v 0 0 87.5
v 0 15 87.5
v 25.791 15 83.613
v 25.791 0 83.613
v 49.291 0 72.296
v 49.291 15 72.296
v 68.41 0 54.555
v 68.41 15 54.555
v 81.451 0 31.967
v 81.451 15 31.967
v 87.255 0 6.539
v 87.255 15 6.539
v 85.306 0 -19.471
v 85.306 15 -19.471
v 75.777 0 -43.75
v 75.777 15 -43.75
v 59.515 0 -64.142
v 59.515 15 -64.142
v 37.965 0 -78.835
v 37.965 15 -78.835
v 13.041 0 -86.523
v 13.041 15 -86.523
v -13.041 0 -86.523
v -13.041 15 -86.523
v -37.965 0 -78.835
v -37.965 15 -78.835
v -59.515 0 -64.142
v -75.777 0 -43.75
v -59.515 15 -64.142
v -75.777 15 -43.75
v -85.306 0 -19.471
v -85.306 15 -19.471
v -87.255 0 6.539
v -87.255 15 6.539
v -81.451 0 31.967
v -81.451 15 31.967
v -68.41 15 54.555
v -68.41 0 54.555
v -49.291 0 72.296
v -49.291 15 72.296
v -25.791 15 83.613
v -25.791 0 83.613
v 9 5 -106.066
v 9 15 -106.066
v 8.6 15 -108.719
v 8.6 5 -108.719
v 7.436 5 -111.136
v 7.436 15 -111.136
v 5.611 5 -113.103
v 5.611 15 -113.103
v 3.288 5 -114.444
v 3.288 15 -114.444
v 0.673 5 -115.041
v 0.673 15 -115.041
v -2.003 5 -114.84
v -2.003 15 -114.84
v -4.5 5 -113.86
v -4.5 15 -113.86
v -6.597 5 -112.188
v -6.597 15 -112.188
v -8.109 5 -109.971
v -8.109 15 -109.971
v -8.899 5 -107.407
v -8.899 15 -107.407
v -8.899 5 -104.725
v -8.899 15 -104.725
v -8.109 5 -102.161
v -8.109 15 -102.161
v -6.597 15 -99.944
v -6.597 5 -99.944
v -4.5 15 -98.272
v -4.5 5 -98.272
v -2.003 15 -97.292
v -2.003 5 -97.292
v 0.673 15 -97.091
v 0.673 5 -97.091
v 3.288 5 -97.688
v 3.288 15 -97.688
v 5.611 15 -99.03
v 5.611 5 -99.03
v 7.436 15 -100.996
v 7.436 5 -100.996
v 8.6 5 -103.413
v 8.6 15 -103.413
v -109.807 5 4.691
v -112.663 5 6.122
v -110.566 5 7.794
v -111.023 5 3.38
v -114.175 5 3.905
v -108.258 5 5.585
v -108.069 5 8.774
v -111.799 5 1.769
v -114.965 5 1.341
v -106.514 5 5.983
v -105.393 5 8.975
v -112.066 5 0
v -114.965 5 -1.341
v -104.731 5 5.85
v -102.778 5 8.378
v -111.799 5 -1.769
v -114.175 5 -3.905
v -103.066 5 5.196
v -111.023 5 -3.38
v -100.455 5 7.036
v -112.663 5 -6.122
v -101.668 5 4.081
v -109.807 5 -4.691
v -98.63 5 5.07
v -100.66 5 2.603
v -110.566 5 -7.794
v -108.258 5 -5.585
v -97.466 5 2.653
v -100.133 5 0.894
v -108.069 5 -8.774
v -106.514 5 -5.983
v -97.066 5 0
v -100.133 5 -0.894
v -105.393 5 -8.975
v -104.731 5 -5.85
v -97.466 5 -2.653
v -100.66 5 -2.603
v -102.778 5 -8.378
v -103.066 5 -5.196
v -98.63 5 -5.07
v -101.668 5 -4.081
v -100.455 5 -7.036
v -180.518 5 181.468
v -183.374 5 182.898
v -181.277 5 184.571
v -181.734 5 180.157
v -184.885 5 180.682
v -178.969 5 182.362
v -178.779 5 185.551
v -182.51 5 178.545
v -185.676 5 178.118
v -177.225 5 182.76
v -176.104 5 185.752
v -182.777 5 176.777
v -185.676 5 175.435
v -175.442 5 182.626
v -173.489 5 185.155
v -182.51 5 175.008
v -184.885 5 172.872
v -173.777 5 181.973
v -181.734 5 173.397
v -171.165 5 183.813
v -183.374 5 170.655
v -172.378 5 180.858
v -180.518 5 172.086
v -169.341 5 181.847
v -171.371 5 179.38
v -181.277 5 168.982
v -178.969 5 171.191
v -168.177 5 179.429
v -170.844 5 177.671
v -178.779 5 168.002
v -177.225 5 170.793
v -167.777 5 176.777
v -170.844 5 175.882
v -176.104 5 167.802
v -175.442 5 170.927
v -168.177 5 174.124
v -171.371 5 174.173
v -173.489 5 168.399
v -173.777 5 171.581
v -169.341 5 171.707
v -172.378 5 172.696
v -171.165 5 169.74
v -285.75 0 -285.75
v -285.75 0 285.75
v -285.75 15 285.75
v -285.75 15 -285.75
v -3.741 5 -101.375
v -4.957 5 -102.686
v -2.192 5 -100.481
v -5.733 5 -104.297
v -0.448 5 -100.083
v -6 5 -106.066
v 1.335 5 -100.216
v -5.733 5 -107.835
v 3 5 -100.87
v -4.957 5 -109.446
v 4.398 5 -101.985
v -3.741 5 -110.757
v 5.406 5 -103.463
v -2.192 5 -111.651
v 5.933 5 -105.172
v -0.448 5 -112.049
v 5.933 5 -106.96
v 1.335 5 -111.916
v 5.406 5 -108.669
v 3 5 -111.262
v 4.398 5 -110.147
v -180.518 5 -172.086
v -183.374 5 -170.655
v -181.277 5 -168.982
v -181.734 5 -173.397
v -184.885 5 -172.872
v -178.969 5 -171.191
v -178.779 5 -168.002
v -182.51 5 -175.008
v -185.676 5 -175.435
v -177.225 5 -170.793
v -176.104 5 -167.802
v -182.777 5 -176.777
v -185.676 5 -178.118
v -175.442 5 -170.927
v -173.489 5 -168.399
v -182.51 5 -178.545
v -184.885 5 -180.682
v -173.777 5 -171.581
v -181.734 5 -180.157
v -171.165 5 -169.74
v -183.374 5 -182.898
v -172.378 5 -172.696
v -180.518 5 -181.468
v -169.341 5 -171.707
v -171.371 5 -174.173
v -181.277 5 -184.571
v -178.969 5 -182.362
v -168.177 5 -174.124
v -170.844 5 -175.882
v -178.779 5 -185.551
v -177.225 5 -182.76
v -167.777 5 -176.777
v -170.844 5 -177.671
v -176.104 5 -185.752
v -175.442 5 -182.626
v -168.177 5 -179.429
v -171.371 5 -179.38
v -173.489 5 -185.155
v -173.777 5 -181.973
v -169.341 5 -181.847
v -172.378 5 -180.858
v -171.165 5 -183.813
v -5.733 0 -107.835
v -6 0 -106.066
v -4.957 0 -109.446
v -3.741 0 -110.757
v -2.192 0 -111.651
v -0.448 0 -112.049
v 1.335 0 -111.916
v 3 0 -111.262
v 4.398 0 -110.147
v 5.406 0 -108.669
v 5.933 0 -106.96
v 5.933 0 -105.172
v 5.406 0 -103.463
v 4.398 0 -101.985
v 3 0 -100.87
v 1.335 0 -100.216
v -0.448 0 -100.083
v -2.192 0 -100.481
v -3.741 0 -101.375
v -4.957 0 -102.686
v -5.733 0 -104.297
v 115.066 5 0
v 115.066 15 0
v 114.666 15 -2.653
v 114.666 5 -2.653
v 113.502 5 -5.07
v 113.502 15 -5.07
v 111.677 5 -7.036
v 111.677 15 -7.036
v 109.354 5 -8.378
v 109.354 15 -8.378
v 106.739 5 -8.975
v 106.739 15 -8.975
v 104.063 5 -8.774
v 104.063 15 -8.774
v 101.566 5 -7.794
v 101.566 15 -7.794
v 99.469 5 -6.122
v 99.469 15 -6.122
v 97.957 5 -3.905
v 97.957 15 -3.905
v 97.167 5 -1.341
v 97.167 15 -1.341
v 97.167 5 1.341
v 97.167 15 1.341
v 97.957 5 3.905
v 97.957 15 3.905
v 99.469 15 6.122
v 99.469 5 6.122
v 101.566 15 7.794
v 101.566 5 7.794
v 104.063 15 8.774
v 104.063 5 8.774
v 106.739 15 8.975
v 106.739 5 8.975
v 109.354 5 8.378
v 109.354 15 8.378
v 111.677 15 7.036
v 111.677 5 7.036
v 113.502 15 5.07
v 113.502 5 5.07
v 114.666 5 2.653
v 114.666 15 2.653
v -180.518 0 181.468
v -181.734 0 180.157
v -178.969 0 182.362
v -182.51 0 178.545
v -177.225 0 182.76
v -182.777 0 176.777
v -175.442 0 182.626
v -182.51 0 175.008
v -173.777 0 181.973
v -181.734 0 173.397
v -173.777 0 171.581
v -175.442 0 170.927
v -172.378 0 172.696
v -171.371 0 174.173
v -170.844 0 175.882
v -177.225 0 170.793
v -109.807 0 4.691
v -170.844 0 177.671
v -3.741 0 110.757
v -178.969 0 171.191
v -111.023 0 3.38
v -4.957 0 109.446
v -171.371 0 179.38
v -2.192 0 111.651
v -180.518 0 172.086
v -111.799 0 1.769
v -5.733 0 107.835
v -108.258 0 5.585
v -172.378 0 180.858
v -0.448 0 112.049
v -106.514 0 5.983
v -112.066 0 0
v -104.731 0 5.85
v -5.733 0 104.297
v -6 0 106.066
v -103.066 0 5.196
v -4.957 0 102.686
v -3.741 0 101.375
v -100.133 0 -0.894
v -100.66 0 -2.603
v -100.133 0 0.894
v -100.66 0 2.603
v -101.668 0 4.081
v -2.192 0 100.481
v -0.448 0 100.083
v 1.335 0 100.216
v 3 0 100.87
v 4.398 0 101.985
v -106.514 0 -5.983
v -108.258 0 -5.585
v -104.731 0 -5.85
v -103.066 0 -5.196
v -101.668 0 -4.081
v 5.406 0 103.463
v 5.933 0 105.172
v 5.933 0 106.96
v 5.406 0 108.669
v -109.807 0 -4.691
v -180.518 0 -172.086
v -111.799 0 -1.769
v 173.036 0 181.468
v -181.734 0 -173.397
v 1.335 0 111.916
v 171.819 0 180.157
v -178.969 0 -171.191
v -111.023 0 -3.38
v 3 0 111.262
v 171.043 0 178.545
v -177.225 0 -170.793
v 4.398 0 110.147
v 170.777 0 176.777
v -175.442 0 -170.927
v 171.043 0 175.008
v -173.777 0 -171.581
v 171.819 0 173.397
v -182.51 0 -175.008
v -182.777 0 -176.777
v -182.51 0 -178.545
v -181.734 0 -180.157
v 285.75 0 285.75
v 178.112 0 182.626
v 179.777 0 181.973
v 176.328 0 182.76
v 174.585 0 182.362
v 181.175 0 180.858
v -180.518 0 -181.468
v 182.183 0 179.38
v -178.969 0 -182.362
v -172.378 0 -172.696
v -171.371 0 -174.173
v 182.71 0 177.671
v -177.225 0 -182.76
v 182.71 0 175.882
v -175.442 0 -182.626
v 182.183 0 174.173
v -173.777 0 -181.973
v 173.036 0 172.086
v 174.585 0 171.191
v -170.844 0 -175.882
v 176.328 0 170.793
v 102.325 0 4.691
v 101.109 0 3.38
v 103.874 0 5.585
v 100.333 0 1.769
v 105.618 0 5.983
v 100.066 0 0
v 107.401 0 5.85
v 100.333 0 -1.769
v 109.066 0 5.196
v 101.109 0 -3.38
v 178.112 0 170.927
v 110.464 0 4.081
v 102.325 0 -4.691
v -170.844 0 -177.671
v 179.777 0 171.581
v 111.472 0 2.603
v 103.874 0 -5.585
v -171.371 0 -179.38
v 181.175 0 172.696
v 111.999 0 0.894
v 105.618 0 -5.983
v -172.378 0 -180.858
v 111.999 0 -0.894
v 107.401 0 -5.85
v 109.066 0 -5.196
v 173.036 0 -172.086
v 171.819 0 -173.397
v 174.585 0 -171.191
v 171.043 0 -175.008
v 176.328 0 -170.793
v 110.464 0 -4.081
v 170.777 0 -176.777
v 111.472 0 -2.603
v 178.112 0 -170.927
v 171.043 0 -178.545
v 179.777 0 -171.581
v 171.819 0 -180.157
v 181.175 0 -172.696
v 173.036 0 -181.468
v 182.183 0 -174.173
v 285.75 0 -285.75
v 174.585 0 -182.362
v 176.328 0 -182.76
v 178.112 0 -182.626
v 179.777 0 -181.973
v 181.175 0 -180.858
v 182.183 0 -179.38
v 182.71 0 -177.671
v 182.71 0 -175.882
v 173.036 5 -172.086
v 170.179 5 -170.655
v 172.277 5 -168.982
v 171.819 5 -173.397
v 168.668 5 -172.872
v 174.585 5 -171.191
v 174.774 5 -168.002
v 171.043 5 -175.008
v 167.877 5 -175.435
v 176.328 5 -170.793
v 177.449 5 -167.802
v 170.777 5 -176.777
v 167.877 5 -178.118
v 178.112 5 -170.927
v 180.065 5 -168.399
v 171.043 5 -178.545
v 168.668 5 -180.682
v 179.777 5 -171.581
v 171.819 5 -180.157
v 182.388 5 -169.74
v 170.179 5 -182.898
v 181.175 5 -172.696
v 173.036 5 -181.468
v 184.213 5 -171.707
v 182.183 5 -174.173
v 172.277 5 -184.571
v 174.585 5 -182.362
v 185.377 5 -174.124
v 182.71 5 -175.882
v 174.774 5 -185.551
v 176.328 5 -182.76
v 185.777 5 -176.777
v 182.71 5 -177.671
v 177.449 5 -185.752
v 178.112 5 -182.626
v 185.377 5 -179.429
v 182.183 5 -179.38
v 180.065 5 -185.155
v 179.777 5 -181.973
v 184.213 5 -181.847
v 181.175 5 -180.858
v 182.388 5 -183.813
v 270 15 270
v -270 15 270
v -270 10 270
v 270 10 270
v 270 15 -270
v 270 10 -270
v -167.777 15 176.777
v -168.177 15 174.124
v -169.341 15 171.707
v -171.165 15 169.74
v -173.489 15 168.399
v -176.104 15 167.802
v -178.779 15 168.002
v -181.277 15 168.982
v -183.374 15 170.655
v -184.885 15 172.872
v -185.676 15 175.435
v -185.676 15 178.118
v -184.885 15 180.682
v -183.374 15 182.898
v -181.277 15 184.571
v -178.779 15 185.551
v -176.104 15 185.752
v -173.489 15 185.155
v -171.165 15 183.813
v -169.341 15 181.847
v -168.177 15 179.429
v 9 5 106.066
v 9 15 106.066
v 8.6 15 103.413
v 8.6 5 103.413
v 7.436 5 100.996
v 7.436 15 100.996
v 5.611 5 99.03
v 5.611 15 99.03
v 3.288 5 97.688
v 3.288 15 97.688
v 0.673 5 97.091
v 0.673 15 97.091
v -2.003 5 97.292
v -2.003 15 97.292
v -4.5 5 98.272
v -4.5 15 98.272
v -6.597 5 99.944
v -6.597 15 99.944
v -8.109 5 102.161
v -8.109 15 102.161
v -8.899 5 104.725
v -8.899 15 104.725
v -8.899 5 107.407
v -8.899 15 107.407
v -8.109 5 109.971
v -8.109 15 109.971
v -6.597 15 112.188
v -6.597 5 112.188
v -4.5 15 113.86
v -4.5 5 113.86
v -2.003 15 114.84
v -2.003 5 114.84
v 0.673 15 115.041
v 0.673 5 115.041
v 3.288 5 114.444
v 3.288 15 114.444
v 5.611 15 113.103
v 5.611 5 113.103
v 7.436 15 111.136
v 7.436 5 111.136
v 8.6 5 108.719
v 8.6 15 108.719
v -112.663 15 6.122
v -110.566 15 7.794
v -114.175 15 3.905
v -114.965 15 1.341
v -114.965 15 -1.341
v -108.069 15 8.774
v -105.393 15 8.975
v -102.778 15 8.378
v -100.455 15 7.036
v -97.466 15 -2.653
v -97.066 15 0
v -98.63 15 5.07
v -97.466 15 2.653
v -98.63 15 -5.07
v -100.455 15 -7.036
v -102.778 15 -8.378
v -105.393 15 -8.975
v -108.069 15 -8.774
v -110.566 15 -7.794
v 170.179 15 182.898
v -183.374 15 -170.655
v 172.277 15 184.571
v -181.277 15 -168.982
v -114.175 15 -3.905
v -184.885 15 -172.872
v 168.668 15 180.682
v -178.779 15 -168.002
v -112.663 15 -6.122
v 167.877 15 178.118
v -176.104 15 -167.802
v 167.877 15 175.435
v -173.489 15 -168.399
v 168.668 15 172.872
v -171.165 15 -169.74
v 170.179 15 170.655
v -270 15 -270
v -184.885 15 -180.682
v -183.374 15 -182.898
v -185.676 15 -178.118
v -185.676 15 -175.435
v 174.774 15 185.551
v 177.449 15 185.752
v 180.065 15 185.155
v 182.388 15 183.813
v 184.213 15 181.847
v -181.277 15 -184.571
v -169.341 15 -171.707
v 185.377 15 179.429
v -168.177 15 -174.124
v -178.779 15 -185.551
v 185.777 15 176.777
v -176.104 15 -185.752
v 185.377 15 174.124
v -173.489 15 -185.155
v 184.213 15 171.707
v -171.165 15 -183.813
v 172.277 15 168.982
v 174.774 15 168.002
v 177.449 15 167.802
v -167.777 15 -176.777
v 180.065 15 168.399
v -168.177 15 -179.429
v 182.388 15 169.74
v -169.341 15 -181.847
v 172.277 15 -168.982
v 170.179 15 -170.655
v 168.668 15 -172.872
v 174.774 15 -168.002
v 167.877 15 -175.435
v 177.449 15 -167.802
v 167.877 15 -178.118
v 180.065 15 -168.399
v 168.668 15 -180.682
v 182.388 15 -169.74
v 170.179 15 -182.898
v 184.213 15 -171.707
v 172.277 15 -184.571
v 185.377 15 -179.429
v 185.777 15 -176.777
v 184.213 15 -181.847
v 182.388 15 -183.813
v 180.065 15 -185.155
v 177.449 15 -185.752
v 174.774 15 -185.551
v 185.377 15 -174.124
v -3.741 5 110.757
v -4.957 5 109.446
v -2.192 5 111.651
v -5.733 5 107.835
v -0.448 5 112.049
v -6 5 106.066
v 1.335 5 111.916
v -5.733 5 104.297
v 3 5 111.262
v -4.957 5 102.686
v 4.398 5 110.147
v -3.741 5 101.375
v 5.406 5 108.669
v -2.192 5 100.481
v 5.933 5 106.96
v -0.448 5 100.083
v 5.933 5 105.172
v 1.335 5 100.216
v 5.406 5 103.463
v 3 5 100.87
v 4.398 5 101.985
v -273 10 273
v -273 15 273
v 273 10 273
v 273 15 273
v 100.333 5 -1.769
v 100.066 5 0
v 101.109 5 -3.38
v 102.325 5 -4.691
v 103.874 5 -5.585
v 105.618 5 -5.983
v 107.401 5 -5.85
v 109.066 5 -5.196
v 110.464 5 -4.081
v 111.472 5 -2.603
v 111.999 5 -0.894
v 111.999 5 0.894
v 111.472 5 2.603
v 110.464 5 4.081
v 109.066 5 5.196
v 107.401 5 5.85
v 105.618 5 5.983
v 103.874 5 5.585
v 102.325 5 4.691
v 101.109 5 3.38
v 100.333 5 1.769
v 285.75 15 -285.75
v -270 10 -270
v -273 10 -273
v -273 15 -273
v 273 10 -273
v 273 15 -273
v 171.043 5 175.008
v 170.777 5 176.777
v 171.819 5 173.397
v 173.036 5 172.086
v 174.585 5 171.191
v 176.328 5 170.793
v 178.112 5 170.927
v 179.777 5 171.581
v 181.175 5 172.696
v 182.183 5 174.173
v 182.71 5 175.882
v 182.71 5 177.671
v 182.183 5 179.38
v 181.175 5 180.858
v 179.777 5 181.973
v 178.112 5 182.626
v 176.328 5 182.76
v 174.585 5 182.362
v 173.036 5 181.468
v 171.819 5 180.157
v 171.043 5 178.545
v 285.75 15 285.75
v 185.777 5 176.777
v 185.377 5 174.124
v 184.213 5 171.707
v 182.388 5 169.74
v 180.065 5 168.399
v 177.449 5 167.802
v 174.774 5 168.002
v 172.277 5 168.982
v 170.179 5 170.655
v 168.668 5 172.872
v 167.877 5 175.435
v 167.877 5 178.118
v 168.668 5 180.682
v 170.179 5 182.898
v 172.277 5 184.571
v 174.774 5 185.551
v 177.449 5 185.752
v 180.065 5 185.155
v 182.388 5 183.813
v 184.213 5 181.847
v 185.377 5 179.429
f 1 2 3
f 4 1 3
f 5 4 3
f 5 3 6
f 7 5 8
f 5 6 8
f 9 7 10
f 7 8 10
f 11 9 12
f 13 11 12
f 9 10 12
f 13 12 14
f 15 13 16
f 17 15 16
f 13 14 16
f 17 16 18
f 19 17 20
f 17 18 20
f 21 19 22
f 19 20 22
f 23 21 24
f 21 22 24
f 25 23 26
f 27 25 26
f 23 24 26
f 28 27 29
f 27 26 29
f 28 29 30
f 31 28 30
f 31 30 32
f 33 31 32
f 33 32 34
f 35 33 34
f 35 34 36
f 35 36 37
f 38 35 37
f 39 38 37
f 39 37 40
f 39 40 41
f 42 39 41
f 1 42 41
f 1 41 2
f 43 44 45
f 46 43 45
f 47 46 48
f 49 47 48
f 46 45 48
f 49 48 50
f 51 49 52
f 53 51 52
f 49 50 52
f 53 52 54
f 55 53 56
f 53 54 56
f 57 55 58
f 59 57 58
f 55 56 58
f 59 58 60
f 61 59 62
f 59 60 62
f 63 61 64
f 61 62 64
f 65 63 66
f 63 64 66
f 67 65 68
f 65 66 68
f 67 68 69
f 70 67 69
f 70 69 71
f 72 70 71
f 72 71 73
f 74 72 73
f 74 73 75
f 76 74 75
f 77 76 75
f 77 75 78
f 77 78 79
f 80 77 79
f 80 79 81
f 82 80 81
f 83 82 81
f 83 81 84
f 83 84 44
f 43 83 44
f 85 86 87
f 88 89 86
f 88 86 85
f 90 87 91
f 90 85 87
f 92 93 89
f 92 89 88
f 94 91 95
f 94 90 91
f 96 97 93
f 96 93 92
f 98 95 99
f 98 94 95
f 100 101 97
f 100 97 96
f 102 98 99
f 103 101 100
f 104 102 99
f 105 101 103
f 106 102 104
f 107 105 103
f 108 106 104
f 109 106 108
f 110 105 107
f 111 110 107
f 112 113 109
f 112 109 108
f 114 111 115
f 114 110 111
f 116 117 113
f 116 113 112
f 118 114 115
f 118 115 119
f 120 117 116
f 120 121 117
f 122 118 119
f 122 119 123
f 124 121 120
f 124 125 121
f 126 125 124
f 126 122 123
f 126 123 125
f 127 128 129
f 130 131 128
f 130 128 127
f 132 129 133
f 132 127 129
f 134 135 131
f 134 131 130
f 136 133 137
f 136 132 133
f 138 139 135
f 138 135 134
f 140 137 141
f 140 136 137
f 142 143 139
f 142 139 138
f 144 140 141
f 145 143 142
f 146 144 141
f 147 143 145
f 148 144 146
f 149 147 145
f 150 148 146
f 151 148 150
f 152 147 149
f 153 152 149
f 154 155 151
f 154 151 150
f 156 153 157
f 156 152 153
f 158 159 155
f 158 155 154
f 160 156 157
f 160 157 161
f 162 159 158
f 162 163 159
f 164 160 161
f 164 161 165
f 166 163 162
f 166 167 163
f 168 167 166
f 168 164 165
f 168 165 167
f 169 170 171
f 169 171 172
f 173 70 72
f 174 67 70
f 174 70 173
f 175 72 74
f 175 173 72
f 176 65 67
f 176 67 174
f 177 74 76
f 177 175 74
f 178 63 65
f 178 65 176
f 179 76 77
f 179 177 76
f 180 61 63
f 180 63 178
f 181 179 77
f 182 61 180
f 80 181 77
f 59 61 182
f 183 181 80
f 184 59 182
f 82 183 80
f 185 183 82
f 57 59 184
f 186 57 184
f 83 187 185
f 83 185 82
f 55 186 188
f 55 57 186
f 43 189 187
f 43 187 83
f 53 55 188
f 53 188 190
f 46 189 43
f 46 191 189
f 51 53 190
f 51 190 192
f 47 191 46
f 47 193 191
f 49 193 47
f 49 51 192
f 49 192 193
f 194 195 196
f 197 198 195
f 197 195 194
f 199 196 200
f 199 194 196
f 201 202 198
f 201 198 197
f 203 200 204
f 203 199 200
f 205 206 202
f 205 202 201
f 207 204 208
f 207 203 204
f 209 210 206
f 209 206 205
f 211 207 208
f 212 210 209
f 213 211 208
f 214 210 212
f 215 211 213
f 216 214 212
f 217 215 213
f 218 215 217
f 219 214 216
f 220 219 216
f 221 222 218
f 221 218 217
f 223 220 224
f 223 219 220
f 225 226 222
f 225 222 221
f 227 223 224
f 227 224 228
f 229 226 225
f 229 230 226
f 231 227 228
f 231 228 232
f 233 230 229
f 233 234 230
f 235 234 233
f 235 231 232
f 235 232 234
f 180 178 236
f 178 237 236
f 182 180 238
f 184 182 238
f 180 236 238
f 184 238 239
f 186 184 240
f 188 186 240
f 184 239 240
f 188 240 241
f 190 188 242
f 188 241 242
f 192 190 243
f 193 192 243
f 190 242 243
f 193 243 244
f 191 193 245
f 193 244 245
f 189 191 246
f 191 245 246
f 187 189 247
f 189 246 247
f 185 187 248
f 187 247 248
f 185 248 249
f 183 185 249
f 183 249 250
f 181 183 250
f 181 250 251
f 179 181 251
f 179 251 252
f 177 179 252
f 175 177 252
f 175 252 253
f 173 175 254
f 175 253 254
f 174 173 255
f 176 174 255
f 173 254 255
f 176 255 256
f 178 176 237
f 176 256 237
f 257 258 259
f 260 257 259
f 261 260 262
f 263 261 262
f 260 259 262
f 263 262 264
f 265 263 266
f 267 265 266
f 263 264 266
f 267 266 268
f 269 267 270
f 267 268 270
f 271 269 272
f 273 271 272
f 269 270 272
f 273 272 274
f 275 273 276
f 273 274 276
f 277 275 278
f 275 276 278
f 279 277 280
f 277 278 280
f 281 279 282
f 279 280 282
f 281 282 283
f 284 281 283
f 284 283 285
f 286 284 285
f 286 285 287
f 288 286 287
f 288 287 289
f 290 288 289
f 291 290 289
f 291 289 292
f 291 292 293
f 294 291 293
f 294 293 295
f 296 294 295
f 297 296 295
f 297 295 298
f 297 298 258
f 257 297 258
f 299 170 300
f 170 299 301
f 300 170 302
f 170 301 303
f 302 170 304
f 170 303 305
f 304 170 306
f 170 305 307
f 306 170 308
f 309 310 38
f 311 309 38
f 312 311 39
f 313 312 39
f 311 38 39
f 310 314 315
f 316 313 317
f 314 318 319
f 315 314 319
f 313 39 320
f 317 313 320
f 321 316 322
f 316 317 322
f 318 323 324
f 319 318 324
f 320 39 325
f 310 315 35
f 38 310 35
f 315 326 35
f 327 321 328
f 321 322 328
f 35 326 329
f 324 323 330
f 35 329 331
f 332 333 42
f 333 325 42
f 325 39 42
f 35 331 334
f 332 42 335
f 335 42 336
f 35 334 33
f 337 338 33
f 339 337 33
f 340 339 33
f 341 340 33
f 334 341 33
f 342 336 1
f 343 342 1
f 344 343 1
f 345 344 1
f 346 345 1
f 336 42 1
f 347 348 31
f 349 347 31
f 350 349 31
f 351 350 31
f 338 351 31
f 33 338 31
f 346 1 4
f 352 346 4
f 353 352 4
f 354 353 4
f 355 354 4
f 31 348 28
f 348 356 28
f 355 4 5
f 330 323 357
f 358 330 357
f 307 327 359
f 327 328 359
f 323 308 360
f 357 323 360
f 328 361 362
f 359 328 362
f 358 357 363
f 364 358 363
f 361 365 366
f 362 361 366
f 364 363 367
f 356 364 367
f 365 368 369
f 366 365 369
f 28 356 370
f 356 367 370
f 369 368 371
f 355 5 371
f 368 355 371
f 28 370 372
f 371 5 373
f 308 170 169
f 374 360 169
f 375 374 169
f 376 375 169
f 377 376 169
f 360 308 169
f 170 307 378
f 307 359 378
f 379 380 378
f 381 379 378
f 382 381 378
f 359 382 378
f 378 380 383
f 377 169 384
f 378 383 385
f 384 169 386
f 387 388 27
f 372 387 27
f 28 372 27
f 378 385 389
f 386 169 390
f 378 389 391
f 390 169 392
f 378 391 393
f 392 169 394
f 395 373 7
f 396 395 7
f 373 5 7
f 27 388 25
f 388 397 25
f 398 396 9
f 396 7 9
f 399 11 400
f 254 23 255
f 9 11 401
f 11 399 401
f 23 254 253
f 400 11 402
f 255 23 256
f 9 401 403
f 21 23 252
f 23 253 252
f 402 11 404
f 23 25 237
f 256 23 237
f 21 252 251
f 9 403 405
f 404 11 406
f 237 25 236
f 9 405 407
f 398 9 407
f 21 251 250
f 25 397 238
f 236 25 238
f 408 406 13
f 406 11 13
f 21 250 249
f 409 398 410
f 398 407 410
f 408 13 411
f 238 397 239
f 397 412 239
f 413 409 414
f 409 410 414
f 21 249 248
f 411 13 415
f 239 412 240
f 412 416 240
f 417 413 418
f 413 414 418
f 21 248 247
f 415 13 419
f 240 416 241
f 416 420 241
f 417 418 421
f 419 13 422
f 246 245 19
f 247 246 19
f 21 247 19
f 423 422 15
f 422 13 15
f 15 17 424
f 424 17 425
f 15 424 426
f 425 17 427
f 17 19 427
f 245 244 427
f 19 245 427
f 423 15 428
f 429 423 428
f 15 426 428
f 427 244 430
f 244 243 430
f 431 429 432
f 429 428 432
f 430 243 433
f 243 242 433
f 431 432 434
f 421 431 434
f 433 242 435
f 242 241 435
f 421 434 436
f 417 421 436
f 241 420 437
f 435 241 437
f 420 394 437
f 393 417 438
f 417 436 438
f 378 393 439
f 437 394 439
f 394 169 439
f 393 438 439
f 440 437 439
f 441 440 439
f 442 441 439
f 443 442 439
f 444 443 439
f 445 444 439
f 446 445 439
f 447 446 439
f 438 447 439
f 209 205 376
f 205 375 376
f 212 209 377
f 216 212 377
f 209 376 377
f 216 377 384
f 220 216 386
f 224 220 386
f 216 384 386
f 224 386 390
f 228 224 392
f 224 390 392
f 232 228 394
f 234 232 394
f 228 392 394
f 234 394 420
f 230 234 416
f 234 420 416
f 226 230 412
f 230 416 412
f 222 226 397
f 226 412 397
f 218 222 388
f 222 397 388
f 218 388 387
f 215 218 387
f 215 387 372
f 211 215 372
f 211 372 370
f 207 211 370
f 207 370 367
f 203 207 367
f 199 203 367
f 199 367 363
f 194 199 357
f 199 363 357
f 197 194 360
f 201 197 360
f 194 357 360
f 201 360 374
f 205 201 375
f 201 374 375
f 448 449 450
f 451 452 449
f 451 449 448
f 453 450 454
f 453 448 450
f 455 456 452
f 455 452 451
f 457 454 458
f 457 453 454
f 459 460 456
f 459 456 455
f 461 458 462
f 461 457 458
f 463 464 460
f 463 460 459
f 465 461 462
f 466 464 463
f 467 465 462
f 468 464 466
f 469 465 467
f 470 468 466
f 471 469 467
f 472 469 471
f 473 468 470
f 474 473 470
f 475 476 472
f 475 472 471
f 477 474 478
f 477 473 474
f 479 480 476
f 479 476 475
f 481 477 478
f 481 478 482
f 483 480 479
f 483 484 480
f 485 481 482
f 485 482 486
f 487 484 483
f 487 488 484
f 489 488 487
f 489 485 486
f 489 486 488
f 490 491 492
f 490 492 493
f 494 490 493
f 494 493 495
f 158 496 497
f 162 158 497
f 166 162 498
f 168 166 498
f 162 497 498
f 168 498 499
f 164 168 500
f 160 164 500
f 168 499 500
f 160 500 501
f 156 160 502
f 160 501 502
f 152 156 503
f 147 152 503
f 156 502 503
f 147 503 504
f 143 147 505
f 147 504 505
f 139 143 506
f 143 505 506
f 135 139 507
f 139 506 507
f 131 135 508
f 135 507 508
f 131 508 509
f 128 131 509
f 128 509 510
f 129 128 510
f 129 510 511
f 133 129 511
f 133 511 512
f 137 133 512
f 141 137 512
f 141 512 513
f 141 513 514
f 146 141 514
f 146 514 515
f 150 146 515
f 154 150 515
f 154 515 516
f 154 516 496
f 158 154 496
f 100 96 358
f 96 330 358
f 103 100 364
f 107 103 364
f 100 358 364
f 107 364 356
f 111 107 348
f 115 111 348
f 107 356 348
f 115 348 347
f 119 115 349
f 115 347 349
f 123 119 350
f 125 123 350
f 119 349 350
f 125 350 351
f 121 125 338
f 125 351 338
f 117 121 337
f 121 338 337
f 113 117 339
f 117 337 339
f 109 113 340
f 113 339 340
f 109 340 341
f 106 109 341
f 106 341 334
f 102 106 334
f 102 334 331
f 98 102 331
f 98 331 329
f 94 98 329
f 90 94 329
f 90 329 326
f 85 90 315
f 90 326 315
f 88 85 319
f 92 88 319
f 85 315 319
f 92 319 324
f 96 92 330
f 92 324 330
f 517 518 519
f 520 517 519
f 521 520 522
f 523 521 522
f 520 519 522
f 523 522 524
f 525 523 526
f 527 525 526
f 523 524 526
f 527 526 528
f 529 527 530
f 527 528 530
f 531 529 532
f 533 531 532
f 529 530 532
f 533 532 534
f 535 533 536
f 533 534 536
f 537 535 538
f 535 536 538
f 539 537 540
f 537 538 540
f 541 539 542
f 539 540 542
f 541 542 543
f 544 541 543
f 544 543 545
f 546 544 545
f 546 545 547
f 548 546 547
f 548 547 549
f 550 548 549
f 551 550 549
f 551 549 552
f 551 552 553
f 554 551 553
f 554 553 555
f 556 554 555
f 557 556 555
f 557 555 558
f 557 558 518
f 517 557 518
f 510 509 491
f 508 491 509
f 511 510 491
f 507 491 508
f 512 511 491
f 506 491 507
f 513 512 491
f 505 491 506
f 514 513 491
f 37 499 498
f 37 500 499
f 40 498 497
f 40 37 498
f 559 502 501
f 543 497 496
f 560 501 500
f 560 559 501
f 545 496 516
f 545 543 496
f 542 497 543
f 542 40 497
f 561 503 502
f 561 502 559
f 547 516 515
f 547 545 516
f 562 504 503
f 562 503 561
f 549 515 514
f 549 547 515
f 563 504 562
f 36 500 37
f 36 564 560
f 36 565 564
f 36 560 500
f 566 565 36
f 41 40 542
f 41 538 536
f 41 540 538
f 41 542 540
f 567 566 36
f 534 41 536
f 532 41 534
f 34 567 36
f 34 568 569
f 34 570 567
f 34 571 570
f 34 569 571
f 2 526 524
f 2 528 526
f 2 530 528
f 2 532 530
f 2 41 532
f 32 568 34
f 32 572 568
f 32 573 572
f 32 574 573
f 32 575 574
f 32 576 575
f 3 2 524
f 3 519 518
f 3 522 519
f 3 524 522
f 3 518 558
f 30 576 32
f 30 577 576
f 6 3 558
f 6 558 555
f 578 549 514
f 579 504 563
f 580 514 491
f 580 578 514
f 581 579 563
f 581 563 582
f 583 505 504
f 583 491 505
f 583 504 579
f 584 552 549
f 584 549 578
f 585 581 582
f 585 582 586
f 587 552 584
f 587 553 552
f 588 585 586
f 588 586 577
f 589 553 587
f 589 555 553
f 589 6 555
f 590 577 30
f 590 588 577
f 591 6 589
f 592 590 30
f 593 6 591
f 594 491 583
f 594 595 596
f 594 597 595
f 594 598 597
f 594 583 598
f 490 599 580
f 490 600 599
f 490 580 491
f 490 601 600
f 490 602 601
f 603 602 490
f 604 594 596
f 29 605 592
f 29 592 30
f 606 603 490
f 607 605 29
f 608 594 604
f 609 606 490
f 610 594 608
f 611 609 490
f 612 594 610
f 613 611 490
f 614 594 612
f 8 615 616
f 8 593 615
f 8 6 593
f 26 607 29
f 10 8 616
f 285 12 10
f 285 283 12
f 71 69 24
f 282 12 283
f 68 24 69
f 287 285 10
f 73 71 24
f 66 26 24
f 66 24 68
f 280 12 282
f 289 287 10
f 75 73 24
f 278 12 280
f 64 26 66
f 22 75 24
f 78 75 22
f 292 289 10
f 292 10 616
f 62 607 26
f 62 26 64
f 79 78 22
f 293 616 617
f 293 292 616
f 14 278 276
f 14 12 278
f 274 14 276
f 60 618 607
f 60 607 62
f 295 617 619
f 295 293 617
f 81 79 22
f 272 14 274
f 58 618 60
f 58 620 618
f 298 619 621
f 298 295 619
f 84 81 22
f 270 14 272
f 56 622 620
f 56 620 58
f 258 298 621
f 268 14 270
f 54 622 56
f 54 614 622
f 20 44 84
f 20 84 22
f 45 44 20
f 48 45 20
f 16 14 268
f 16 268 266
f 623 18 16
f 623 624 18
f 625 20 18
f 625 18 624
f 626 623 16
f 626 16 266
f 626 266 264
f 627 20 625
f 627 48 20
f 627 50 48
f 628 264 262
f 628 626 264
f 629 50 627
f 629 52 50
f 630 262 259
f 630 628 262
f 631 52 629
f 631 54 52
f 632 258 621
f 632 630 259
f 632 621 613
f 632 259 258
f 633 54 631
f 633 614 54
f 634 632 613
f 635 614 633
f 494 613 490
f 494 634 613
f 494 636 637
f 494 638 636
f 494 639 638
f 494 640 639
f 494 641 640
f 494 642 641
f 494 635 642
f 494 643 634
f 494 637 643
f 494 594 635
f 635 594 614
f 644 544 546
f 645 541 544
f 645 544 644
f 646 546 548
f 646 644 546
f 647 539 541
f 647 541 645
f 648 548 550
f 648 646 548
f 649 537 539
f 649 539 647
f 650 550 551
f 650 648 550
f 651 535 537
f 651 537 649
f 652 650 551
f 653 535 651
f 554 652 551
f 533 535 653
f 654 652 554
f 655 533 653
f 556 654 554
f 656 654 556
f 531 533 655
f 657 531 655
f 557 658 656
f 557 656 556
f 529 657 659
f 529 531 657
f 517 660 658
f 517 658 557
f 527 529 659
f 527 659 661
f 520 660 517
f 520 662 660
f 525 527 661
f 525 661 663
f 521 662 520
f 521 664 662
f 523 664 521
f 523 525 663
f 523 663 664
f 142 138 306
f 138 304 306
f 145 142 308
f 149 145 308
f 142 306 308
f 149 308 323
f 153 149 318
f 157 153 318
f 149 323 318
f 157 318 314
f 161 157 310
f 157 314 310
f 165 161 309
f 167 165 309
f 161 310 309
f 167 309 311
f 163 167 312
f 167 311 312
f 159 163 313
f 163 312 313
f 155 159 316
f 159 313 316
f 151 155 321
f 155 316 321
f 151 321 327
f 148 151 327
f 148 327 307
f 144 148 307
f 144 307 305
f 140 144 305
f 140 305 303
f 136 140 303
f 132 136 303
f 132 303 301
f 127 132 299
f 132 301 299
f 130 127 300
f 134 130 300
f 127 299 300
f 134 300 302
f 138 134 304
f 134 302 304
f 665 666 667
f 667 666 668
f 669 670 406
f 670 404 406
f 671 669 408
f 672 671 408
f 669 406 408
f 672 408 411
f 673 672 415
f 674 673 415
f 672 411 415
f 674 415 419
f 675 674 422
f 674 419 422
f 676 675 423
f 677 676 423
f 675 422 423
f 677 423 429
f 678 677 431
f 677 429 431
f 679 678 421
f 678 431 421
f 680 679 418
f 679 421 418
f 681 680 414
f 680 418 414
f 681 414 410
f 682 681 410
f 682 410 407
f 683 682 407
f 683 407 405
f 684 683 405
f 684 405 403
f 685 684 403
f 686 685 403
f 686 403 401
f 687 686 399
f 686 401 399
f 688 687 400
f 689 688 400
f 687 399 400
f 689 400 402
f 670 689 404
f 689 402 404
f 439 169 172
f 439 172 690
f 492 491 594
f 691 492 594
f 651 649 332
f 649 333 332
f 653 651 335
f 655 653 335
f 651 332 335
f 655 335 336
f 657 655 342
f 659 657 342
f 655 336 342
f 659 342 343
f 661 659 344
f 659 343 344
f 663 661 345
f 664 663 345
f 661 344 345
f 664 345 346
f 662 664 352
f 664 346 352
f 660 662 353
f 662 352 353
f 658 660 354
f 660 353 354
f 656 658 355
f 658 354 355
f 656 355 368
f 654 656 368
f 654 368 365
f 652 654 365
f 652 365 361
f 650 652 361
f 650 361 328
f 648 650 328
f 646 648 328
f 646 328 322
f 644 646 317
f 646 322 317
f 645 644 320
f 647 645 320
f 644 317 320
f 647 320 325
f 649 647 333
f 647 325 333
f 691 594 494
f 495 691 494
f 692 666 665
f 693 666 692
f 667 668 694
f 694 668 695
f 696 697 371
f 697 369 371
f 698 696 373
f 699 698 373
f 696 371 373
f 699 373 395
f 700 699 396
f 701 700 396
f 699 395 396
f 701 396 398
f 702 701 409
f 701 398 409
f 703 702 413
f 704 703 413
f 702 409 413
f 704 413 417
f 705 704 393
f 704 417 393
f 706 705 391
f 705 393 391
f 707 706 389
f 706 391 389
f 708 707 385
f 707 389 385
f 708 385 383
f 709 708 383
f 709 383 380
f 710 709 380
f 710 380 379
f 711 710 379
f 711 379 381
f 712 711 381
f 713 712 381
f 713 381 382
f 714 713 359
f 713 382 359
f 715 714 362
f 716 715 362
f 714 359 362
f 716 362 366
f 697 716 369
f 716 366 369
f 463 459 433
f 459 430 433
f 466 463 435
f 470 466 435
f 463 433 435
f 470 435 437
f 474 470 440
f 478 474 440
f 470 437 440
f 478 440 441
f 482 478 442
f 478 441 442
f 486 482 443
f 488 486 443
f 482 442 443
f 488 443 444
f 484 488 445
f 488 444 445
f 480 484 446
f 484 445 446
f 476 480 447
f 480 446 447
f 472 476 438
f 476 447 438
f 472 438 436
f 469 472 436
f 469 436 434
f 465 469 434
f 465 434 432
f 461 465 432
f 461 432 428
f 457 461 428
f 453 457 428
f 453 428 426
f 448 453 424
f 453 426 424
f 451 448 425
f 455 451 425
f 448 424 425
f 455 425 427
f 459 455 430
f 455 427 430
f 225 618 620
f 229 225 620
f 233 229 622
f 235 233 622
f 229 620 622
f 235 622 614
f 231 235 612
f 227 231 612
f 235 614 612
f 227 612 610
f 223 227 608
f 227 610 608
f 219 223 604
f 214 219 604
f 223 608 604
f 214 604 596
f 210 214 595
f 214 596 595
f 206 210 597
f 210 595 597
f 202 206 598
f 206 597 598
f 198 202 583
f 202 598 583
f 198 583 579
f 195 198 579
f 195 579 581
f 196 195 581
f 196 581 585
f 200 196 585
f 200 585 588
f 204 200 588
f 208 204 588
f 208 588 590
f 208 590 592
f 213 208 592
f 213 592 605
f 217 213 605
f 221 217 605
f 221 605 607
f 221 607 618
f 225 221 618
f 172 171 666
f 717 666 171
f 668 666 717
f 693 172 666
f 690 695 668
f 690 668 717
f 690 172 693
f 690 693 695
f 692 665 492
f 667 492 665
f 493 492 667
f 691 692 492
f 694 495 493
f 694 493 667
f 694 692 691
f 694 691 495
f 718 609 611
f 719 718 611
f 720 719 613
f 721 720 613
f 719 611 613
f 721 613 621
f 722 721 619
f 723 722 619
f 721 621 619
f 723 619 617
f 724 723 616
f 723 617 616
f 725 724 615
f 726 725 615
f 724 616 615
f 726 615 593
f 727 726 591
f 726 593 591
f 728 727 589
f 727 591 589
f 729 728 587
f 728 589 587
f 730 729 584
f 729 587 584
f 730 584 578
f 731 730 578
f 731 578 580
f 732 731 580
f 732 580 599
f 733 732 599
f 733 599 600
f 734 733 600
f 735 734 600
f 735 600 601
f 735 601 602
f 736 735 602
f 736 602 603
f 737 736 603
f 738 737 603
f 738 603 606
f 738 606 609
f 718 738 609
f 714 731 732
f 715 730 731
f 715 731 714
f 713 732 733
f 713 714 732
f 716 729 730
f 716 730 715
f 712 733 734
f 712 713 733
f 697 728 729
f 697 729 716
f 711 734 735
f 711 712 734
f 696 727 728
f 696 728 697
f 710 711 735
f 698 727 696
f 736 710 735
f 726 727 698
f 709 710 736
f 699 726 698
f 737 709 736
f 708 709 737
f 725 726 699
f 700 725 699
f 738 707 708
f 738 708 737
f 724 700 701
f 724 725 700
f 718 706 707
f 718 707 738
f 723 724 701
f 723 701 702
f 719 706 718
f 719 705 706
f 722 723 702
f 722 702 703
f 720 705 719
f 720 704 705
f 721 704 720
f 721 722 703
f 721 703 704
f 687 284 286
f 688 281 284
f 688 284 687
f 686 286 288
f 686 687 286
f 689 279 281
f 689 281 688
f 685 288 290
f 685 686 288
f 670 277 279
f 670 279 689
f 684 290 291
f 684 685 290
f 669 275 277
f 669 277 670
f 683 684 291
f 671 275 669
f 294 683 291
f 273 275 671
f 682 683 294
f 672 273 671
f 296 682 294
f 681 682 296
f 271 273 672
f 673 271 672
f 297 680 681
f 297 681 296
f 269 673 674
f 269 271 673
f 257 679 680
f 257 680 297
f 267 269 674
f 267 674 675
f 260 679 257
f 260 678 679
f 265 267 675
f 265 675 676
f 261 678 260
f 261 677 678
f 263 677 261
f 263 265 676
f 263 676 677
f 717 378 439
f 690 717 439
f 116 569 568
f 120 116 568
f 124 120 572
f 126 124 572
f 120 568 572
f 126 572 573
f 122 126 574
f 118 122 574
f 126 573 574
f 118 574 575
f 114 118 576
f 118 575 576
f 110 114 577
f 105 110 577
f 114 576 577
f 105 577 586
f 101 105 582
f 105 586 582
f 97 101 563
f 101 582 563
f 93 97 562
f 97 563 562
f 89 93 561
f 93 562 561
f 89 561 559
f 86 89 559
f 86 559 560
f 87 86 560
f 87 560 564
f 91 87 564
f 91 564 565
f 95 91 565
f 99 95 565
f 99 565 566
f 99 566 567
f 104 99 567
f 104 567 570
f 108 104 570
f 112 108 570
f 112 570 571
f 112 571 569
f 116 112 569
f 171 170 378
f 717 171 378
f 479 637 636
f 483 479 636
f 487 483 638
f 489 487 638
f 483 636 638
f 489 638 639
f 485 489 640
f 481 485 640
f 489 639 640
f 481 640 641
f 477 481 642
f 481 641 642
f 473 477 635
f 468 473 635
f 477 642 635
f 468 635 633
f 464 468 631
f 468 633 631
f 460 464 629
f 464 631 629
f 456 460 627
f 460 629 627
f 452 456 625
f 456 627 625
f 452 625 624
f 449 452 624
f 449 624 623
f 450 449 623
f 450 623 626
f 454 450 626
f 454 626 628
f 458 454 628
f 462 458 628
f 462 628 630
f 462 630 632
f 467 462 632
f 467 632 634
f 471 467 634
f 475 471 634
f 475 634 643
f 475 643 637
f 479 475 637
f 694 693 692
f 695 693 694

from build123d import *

# Parameters (mm, degrees)
SKETCH1_W                      = 571.5
SKETCH1_H                      = 571.5
PLATE_DEPTH                    = 15
SKETCH2_R                      = 87.5
BEARING_HOLE_DEPTH             = 405.389818121
CBORE_FOR_M10_SHCS_D           = 12
CBORE_FOR_M10_SHCS_CBORE_D     = 18
CBORE_FOR_M10_SHCS_CBORE_DEPTH = 10
SKETCH7_W                      = 546
SKETCH7_H                      = 546
SKETCH7_W_2                    = 540
SKETCH7_H_2                    = 540
CUT_EXTRUDE1_DEPTH             = 5


with BuildPart() as part:
    # Sketch1 → plate (new body)
    with BuildSketch(Plane(origin=(0, 0, 0), x_dir=(1, 0, 0), z_dir=(0, 1, 0))):
        Rectangle(SKETCH1_W, SKETCH1_H)
    extrude(amount=PLATE_DEPTH)

    # Sketch2 → bearing-hole (cut, through all)
    with BuildSketch(Plane(origin=(0, 15, 0), x_dir=(1, 0, 0), z_dir=(0, 1, 0))):
        with Locations(Location((0, 0, 0), (0, 0, 270))):
            Circle(SKETCH2_R)
    extrude(amount=-BEARING_HOLE_DEPTH, mode=Mode.SUBTRACT)

    # CBORE for M10 SHCS (through all)
    with Locations(Plane(origin=(0, 15, 0), x_dir=(1, 0, 0), z_dir=(0, 1, 0))):
        with Locations((0, 0), (-106.066017178, 0), (0, 106.066017178), (106.066017178, 0), (0, -106.066017178), (176.776695297, 176.776695297), (-176.776695297, 176.776695297), (176.776695297, -176.776695297), (-176.776695297, -176.776695297)):
            CounterBoreHole(CBORE_FOR_M10_SHCS_D / 2, CBORE_FOR_M10_SHCS_CBORE_D / 2, CBORE_FOR_M10_SHCS_CBORE_DEPTH)

    # Sketch7 → Cut-Extrude1 (cut)
    with BuildSketch(Plane(origin=(0, 15, 0), x_dir=(1, 0, 0), z_dir=(0, 1, 0))):
        Rectangle(SKETCH7_W, SKETCH7_H)
        Rectangle(SKETCH7_W_2, SKETCH7_H_2, mode=Mode.SUBTRACT)
    extrude(amount=-CUT_EXTRUDE1_DEPTH, mode=Mode.SUBTRACT)


solid = part.part
